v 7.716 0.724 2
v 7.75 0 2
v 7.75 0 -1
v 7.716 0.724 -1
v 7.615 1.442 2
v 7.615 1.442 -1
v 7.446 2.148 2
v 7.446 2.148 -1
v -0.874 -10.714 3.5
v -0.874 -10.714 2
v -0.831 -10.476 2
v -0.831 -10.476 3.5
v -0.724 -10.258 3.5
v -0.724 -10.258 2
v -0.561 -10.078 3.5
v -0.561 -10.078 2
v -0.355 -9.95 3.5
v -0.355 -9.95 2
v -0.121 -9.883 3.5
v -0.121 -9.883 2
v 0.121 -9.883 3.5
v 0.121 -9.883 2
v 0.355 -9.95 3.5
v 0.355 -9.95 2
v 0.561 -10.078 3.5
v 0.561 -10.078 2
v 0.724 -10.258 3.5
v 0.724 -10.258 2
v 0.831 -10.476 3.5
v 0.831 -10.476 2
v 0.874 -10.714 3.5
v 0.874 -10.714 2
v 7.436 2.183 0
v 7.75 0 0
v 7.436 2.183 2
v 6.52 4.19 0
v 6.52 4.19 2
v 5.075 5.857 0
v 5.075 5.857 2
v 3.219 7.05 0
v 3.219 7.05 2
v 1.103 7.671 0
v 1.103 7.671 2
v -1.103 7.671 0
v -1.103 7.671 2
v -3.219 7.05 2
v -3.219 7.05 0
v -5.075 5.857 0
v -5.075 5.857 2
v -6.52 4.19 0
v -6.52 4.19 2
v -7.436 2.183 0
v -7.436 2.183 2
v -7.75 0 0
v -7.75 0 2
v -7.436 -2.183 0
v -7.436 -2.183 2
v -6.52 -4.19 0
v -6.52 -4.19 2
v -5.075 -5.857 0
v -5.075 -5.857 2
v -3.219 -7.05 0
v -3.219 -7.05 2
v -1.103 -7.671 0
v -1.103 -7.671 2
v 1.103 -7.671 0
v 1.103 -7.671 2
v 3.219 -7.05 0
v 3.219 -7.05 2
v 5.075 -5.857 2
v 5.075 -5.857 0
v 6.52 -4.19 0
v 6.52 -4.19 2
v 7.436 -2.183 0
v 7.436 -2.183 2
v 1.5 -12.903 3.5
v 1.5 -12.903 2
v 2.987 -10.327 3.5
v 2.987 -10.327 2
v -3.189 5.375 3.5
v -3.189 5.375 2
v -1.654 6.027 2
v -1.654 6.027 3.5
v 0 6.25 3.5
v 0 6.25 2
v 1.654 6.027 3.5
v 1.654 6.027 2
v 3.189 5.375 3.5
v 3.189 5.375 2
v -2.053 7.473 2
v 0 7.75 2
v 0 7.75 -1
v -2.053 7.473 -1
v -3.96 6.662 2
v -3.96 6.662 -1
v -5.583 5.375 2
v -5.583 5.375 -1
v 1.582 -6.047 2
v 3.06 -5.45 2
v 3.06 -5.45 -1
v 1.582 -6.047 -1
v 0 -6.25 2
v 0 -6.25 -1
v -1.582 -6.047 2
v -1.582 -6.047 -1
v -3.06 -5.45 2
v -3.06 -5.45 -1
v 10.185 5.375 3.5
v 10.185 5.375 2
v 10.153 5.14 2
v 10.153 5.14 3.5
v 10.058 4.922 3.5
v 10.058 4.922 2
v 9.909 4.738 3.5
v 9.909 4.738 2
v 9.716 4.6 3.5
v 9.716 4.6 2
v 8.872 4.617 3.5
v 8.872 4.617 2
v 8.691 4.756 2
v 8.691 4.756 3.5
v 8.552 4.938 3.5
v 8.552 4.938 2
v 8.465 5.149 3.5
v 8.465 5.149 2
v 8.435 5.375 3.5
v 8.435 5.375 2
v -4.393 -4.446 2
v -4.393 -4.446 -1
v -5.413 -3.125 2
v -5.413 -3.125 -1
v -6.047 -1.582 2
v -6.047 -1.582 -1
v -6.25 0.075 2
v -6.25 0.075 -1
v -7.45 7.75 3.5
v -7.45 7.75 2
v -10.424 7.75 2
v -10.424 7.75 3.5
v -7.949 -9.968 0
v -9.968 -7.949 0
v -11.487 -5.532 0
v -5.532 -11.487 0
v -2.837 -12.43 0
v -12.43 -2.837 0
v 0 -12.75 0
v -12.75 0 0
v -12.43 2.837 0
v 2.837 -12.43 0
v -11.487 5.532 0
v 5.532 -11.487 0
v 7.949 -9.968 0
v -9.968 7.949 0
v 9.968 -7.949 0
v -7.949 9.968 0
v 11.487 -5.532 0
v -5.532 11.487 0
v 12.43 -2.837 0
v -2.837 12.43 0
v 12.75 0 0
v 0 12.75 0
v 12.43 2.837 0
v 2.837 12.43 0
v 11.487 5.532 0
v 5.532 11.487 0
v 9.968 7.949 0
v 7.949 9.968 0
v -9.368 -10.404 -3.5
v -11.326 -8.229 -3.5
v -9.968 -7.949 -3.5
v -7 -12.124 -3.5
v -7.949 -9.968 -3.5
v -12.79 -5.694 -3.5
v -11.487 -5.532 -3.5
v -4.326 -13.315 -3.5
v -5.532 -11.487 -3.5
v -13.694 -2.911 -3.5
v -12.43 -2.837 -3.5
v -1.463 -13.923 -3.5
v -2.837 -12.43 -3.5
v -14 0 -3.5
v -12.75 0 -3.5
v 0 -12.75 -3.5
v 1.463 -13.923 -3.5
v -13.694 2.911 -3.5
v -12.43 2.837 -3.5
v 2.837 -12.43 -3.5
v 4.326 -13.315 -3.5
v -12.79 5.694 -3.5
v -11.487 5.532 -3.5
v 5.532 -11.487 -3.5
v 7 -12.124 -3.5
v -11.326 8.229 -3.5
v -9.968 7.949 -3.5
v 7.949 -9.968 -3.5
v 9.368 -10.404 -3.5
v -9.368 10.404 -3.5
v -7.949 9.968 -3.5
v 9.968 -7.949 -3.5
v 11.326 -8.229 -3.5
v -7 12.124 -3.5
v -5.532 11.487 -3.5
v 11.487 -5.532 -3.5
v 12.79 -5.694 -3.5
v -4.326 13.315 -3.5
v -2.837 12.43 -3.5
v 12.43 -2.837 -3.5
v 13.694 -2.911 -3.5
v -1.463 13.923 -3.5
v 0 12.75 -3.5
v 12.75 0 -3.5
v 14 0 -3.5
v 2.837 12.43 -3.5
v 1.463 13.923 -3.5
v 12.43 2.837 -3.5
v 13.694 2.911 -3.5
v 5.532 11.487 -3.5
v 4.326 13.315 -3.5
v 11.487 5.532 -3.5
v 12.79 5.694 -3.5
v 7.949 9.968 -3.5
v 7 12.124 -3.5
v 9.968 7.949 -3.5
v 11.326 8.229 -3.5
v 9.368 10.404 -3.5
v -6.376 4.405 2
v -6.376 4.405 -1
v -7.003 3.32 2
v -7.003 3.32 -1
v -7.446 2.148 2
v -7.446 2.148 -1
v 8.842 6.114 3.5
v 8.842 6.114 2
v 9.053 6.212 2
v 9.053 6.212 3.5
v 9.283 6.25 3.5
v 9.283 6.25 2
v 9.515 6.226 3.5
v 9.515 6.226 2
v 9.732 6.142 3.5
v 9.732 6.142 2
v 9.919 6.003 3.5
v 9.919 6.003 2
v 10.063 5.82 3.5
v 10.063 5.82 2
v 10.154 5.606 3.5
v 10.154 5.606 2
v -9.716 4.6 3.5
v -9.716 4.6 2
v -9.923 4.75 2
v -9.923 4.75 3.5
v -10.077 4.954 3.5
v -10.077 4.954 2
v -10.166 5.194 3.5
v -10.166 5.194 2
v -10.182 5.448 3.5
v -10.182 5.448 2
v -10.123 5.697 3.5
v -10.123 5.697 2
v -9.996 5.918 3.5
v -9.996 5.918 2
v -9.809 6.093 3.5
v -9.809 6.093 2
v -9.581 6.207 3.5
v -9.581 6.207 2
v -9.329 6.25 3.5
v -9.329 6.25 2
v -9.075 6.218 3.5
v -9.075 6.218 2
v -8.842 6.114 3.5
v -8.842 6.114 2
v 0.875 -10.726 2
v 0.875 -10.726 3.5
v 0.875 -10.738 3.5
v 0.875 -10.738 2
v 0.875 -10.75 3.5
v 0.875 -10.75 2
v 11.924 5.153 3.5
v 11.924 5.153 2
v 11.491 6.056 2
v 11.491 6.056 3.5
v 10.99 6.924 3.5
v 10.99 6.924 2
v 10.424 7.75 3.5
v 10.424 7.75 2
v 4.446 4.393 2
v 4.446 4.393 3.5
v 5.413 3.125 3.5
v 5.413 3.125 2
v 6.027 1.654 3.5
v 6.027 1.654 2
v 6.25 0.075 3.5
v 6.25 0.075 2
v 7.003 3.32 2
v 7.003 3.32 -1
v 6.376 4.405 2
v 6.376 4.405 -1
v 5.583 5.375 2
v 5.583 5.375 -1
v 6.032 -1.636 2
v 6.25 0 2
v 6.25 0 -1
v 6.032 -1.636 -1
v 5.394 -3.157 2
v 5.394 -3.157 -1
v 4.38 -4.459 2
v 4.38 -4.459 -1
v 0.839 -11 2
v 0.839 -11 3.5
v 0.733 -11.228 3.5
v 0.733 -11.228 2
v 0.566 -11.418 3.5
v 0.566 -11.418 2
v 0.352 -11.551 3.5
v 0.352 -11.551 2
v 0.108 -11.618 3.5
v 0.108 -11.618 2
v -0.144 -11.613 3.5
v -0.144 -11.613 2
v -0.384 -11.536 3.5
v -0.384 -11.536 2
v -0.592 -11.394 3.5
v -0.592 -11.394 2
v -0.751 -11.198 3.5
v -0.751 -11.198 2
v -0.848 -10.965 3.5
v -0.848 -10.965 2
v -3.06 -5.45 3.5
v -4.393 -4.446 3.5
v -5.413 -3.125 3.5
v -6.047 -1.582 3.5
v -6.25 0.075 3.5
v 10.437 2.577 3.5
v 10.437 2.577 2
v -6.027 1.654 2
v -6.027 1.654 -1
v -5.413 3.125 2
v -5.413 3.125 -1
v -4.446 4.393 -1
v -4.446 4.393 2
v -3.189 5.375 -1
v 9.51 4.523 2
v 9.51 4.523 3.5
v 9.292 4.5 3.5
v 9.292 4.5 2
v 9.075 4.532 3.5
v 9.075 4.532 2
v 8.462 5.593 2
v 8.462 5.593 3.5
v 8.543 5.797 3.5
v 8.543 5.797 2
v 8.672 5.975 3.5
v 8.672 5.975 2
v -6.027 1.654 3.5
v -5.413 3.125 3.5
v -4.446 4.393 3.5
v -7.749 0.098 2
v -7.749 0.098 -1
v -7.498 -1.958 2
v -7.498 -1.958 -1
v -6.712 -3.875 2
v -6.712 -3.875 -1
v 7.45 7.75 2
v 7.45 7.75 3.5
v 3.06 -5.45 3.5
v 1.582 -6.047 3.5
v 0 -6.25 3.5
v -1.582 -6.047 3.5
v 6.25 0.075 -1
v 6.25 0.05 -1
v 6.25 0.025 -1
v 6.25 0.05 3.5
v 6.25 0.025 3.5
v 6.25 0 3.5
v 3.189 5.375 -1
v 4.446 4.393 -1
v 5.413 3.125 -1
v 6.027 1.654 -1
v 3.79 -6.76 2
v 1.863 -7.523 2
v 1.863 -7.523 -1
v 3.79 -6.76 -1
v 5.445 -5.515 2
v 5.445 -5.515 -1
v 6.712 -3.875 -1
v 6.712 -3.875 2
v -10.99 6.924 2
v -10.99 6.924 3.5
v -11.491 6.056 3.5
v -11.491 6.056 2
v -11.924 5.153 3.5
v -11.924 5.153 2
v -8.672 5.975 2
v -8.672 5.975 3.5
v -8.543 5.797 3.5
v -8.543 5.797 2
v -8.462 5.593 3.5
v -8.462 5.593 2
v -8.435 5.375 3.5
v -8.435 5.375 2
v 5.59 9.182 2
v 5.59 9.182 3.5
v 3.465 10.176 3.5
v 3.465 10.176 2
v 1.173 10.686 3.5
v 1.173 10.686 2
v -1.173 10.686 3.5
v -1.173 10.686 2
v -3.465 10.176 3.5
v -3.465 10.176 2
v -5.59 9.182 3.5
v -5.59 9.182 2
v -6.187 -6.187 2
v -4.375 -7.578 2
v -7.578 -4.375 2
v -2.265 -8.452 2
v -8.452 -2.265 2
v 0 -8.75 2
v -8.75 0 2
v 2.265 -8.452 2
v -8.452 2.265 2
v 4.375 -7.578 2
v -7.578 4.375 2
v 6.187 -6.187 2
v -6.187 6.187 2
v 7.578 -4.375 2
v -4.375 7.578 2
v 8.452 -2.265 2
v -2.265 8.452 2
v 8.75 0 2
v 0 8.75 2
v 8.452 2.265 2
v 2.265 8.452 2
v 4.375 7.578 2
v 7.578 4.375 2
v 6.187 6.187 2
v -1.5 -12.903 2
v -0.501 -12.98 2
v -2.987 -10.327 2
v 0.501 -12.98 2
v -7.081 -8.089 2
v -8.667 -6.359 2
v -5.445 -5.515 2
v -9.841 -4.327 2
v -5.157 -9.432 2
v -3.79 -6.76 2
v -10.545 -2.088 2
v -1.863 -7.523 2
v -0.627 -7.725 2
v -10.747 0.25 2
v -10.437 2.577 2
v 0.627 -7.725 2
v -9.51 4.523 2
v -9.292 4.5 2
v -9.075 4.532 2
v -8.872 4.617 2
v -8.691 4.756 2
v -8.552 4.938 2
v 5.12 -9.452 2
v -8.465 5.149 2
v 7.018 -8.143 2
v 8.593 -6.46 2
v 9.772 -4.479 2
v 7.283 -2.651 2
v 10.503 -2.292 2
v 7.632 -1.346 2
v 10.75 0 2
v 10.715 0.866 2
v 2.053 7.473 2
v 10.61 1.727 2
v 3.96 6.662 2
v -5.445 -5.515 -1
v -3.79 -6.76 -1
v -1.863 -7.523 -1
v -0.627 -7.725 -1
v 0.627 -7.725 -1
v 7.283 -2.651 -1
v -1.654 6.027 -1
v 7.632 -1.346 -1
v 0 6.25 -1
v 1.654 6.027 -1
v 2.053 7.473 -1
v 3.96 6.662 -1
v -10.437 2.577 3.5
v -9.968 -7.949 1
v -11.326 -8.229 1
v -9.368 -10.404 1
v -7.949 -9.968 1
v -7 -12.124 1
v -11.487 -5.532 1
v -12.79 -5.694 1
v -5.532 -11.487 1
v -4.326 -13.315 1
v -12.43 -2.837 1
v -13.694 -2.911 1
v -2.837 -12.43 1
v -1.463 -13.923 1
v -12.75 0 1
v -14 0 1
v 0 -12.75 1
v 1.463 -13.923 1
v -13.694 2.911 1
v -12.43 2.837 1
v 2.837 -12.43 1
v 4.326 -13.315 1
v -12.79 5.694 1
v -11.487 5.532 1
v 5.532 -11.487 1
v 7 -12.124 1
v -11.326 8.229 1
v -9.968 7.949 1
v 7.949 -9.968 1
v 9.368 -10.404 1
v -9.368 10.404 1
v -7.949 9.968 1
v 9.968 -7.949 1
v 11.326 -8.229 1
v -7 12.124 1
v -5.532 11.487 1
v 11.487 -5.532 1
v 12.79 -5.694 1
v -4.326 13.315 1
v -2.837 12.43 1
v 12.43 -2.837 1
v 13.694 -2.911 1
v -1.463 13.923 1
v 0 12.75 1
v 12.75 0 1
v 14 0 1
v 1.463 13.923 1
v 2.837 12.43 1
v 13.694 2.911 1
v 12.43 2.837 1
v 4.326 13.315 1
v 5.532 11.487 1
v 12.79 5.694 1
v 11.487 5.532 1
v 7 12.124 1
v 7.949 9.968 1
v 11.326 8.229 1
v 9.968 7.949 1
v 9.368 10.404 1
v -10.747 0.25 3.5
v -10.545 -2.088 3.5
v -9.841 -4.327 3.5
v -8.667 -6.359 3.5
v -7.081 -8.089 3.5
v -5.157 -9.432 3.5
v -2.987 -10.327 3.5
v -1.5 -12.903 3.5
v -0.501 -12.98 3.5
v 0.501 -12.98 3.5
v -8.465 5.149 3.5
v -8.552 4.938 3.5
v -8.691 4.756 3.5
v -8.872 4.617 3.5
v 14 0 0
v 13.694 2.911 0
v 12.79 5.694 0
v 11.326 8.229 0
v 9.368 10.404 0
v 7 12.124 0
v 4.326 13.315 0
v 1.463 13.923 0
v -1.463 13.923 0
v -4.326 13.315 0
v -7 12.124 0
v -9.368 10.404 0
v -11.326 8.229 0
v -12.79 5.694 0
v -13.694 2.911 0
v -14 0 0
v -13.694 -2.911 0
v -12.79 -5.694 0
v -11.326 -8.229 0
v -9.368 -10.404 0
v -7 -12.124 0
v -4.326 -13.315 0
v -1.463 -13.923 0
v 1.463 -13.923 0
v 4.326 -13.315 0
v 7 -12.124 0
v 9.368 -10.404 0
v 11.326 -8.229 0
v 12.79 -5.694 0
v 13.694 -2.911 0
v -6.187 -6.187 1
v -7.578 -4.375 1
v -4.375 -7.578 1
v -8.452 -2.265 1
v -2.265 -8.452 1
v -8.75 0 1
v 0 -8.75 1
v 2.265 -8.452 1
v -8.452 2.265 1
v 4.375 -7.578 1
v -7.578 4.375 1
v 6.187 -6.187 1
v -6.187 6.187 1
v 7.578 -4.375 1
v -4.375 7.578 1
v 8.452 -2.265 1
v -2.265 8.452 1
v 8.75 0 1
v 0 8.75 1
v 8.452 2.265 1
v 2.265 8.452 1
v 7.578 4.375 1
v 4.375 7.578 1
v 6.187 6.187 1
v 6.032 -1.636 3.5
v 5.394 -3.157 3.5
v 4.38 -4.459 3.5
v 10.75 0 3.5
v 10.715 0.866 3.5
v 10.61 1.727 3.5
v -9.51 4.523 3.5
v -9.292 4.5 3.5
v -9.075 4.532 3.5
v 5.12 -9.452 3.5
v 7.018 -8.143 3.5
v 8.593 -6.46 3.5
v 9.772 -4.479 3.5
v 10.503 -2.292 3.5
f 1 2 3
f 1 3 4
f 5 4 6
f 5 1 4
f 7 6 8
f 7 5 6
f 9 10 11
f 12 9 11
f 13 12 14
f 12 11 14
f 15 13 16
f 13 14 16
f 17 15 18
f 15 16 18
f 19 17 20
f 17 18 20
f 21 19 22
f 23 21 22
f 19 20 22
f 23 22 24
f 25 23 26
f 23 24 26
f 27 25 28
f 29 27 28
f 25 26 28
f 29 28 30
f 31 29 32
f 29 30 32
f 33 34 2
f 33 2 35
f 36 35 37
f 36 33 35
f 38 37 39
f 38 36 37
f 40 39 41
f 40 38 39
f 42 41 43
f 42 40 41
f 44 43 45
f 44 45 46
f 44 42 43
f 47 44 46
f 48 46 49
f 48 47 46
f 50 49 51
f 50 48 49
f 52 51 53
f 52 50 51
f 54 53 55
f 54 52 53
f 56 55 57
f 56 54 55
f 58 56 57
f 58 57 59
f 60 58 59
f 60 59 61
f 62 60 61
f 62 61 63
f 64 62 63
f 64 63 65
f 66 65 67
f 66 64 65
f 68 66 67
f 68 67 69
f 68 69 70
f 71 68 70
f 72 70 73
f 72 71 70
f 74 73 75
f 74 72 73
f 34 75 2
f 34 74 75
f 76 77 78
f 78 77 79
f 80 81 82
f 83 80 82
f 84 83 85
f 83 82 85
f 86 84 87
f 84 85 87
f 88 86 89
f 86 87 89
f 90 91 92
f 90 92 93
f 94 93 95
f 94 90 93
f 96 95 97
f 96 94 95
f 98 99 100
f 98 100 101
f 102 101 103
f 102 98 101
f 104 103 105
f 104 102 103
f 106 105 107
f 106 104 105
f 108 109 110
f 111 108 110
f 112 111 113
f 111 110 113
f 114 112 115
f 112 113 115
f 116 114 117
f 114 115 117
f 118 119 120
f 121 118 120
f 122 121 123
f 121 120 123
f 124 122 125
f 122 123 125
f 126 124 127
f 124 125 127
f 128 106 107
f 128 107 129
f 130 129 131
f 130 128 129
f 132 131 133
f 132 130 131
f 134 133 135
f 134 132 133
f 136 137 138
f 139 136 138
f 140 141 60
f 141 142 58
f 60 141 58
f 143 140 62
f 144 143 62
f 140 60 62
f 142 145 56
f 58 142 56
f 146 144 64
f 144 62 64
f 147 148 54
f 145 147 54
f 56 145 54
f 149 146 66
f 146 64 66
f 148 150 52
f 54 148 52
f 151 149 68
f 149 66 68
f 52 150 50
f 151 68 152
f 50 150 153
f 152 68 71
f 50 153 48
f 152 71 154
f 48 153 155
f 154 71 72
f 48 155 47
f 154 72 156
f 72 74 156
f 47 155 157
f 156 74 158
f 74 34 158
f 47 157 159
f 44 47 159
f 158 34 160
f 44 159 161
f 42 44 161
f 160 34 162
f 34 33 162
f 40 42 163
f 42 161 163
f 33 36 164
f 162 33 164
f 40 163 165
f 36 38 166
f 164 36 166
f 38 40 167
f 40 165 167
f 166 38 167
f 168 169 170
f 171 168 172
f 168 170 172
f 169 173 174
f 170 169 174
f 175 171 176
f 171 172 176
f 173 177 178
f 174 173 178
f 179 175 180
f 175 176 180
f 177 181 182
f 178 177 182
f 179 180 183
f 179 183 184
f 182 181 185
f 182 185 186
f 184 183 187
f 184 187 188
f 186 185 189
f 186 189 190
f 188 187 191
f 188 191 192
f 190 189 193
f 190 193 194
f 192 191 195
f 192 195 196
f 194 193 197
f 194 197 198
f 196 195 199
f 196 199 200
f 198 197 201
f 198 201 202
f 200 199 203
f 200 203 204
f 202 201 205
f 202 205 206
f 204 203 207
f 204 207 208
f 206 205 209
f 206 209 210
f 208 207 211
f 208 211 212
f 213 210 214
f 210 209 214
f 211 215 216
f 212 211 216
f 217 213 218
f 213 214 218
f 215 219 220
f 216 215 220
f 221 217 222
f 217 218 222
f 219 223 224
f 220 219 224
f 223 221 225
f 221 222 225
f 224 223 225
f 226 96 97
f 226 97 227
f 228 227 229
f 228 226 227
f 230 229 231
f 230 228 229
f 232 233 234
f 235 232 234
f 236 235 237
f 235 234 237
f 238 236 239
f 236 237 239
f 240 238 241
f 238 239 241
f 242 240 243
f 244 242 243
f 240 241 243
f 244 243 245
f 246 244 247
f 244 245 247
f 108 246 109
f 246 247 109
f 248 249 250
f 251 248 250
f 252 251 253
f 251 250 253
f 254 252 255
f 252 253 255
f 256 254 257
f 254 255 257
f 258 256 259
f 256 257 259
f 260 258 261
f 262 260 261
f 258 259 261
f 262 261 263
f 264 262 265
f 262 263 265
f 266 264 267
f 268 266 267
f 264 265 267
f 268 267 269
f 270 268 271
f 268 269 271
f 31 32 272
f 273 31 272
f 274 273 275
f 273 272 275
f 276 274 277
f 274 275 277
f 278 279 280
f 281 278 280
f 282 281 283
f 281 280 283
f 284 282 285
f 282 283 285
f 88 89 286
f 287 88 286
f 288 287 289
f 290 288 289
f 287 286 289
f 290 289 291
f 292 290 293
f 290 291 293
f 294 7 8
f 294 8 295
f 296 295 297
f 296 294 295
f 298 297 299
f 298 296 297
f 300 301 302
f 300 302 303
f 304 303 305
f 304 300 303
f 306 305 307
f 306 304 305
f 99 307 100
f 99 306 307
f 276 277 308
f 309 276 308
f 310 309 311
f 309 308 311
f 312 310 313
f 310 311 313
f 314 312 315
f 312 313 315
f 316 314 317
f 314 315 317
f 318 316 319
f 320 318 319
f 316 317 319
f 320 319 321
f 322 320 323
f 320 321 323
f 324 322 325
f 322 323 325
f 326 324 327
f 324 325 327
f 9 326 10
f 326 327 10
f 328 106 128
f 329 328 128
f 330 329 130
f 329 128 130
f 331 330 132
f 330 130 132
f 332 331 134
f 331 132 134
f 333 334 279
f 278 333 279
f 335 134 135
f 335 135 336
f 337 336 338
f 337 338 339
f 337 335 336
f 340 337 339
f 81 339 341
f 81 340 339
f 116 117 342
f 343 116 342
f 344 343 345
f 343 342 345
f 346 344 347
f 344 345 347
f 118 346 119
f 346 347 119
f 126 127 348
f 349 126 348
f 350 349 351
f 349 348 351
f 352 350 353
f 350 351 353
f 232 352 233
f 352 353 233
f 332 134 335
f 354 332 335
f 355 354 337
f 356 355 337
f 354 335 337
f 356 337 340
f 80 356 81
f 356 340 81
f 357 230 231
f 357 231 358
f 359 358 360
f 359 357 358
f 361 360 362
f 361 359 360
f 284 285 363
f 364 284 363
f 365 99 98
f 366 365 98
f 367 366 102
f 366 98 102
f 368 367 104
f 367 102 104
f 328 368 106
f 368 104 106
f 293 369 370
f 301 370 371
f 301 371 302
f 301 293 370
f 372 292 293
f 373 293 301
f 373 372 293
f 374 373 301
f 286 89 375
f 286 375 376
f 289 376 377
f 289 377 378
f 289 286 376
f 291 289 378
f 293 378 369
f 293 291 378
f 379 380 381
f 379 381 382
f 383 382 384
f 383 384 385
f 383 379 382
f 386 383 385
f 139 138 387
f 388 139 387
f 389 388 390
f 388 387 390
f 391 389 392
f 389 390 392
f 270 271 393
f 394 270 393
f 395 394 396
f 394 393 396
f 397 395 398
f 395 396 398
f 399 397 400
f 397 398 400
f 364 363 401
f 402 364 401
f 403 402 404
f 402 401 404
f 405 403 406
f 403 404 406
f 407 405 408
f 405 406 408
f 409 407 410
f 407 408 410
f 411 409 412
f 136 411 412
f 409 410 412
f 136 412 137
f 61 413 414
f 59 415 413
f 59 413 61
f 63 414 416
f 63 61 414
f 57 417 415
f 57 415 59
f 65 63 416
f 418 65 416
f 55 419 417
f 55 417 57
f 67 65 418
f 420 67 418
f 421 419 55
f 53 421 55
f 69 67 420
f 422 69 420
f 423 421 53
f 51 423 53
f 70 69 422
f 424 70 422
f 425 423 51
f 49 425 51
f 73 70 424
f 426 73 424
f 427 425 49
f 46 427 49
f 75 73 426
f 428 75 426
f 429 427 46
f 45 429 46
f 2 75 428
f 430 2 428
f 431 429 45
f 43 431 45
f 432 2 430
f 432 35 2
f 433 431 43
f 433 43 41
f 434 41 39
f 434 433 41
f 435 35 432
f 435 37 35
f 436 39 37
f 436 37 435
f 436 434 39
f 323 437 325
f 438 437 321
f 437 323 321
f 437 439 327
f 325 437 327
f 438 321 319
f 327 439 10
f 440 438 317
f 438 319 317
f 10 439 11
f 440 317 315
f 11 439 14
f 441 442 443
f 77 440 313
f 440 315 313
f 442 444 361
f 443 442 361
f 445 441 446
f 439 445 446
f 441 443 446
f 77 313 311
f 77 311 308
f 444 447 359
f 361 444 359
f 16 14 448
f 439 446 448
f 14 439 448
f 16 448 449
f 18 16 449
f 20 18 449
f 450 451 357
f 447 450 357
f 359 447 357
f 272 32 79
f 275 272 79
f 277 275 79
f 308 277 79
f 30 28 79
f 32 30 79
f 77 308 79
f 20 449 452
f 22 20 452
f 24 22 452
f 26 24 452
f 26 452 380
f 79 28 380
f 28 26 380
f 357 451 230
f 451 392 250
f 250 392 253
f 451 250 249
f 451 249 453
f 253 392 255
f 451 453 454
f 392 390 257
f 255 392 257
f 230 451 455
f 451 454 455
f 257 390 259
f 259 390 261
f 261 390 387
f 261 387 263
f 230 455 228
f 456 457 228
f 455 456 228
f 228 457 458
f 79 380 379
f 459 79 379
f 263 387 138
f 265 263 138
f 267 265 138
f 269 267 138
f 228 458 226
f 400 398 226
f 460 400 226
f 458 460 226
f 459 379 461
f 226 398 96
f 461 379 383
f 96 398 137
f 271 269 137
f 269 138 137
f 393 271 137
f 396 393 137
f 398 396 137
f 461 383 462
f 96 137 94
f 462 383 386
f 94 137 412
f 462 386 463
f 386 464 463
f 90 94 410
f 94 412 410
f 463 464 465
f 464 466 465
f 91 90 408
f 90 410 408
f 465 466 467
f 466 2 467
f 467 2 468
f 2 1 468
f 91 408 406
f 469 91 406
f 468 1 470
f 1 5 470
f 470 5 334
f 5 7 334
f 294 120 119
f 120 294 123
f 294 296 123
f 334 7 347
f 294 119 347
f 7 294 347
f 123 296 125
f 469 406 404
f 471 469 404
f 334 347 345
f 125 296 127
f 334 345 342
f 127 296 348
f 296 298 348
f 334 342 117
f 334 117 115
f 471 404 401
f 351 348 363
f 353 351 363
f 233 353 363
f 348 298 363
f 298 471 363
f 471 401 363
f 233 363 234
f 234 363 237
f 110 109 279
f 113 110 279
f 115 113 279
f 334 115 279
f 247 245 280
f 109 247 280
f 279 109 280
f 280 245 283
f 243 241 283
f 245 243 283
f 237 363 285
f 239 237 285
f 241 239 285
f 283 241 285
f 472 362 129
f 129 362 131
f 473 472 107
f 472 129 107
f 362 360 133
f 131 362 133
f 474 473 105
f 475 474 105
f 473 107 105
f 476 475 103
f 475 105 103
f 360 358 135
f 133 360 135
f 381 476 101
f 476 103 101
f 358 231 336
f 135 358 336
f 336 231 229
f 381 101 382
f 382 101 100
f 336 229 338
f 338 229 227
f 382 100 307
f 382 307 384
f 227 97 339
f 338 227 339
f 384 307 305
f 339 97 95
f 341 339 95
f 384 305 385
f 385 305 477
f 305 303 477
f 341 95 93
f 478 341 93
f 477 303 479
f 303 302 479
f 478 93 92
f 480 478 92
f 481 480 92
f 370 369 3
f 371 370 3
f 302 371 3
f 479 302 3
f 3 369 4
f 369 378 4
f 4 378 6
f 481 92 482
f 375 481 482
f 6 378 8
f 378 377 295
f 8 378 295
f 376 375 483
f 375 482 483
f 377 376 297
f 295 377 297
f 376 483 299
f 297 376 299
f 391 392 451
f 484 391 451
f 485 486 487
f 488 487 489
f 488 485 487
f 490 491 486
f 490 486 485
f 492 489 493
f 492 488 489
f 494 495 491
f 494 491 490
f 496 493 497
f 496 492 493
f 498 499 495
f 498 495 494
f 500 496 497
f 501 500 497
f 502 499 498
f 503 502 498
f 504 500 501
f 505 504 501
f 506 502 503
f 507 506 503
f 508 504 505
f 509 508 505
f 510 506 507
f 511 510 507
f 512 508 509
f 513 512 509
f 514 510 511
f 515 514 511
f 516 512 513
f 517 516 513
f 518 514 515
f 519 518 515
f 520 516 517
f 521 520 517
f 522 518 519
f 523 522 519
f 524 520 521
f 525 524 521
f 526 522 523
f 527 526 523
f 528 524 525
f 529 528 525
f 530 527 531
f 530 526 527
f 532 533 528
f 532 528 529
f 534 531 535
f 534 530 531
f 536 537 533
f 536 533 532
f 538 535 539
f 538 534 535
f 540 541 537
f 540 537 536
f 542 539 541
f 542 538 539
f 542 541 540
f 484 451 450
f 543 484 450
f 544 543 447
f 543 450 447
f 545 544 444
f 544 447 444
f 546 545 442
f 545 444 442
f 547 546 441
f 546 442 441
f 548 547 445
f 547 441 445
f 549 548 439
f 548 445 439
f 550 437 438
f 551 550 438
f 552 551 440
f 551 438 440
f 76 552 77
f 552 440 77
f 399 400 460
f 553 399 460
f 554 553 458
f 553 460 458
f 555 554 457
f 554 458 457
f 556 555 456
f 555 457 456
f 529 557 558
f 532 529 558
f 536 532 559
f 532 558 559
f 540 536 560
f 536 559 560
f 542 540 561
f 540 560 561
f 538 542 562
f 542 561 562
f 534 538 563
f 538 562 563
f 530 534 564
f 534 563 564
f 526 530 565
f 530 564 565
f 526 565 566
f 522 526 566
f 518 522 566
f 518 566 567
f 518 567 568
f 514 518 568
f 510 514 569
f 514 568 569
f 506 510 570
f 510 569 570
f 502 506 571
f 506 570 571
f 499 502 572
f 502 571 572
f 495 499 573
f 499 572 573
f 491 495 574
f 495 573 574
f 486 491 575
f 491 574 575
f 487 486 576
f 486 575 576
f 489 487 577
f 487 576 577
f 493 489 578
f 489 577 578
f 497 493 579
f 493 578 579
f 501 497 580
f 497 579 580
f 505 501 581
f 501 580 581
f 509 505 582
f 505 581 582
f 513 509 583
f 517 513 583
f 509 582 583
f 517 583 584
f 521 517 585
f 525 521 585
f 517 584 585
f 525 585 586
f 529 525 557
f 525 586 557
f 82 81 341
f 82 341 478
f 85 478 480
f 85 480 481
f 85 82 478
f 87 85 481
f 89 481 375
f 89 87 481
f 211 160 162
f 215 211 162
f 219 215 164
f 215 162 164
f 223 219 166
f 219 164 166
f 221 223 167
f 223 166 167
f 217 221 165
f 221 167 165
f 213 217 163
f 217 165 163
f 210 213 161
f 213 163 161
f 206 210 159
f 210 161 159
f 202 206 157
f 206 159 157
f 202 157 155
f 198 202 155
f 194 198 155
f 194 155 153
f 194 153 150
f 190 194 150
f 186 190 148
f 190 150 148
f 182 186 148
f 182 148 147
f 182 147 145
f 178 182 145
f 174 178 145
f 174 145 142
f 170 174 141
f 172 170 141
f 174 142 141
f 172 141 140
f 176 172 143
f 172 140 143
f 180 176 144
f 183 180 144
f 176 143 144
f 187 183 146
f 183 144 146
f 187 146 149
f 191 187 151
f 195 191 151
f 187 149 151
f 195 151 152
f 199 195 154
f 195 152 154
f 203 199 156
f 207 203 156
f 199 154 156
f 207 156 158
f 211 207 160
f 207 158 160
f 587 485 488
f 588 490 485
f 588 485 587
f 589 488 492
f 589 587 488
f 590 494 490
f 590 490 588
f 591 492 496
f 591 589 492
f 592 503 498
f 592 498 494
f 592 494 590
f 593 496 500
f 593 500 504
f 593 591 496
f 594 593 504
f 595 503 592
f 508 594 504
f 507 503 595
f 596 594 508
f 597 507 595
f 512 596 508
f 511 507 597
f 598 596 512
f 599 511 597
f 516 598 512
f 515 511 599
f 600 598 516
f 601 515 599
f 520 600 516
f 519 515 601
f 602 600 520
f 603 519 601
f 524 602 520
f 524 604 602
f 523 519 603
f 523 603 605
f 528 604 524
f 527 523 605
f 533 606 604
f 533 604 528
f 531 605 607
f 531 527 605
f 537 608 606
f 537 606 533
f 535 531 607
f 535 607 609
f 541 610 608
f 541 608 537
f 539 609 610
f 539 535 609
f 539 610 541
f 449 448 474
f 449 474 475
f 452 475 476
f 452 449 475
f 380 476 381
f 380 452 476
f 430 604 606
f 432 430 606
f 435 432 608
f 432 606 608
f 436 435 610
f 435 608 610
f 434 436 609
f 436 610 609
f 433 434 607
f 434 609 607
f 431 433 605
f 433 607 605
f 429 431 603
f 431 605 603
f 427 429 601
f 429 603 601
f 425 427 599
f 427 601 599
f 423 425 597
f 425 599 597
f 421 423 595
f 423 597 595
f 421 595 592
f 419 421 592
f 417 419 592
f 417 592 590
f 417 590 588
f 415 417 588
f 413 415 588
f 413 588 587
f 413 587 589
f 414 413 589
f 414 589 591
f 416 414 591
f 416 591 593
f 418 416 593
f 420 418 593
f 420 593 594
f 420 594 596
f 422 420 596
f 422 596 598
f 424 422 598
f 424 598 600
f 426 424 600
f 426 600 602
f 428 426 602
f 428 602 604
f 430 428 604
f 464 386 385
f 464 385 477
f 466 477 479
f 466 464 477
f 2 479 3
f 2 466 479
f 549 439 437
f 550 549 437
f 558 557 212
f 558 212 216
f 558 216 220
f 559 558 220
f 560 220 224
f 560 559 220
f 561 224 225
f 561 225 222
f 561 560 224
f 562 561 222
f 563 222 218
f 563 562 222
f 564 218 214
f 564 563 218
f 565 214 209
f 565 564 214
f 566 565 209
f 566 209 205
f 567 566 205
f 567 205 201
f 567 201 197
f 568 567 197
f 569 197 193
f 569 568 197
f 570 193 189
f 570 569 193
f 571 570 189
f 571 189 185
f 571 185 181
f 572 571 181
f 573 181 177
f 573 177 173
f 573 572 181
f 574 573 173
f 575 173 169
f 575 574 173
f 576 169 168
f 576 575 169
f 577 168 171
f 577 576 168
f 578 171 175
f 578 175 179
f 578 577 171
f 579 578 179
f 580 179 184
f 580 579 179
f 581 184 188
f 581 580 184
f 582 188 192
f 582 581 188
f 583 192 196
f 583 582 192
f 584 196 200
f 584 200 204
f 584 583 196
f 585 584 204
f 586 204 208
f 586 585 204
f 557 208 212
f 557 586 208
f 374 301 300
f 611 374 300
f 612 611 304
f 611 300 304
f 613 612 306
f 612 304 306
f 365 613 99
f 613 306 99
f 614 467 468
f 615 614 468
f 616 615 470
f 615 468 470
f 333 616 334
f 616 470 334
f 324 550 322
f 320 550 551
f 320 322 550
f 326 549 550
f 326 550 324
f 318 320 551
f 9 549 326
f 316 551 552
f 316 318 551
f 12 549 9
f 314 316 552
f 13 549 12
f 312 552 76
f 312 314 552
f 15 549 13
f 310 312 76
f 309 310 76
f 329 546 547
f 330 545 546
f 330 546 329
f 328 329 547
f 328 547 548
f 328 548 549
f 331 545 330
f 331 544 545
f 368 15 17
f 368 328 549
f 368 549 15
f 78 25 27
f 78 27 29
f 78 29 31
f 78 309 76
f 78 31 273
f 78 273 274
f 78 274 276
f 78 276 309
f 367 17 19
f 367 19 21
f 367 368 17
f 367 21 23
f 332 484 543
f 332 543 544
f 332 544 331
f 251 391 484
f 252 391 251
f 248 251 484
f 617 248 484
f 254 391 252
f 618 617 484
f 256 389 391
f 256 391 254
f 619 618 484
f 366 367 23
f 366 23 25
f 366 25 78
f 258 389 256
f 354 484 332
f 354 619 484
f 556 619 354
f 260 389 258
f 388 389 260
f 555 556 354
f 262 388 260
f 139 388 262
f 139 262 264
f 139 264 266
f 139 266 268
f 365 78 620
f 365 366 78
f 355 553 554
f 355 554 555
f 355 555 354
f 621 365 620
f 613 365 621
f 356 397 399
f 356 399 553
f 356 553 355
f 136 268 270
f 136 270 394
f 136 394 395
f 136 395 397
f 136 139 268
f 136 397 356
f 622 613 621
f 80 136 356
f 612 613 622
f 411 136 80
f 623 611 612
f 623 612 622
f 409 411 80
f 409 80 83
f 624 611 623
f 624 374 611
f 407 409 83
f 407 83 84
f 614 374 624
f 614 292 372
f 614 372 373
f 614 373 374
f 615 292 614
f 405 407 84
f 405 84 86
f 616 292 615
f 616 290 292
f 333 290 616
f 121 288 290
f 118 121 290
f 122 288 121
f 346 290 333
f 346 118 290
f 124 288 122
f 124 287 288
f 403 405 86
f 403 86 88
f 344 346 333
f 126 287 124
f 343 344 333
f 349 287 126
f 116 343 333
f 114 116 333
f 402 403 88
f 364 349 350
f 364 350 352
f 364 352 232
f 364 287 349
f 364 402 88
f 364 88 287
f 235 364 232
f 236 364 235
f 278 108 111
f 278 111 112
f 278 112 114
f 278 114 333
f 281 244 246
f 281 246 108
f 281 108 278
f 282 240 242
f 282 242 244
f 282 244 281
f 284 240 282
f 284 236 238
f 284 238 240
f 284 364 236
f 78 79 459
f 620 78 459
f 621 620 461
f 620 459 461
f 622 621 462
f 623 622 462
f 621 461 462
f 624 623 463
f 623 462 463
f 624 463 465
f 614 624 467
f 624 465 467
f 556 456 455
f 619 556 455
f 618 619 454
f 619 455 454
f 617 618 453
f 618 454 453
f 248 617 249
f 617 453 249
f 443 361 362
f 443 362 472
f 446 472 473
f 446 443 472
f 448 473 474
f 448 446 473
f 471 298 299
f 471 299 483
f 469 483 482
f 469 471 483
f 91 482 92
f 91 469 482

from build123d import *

# Parameters (mm, degrees)
F0_R          = 8.75
F0_R_2        = 7.75
F1_DEPTH      = 2
F0_R_3        = 12.75
F2_DEPTH      = 1
F0_R_4        = 14
F3_DEPTH      = 3.5
F3_DEPTH_BACK = 1
F5_DEPTH      = 1.5
F6_DEPTH      = 3


# Not quite as in the source:
# - ends of sketch curves that miss each other by under 0.0002 mm in the source are joined


with BuildPart() as f1:
    # F0 (on Top) → F1 (new body)
    with BuildSketch(Plane.XY):
        Circle(F0_R)
        Circle(F0_R_2, mode=Mode.SUBTRACT)
    extrude(amount=F1_DEPTH)

    # F0 (on Top) → F2 (join)
    with BuildSketch(Plane.XY):
        Circle(F0_R_3)
        Circle(F0_R, mode=Mode.SUBTRACT)
    extrude(amount=F2_DEPTH)

    # F0 (on Top) → F3 (join, two sides)
    with BuildSketch(Plane.XY) as f3_sk:
        Circle(F0_R_4)
        Circle(F0_R_3, mode=Mode.SUBTRACT)
    extrude(amount=-F3_DEPTH)
    extrude(f3_sk.sketch, amount=F3_DEPTH_BACK)


with BuildPart() as f5:
    # F4 (on face) → F5 (new body)
    with BuildSketch(Plane.XY.offset(2)):
        with BuildLine():
            Line((-7.4498323446, 7.7499998733), (-10.4241976301, 7.7499998733))
            ThreePointArc((-10.4241976301, 7.7499998733), (-11.2492131147, 6.49473622), (-11.9237955847, 5.1526200251))
            Line((-11.9237955847, 5.1526200251), (-10.436612942, 2.5767441277))
            ThreePointArc((-10.436612942, 2.5767441277), (-10.1269990673, 3.606437285), (-9.7160710573, 4.6000503485))
            ThreePointArc((-9.7160710573, 4.6000503485), (-10.067545319, 5.8125), (-8.8417959892, 6.1143391863))
            ThreePointArc((-8.8417959892, 6.1143391863), (-8.1867658396, 6.9670198139), (-7.4498323446, 7.7499998733))
        make_face()
        with BuildLine():
            Line((1.4995979546, -12.9026198984), (2.9867805973, -10.3267440011))
            ThreePointArc((2.9867805973, -10.3267440011), (1.9402332277, -10.5734570989), (0.8742750681, -10.7143895349))
            ThreePointArc((0.8742750681, -10.7143895349), (0.8748187483, -10.7321910784), (0.875, -10.75))
            ThreePointArc((0.875, -10.75), (-0.0178089216, -11.6248187483), (-0.8742750681, -10.7143895349))
            ThreePointArc((-0.8742750681, -10.7143895349), (-1.9402332277, -10.5734570989), (-2.9867805973, -10.3267440011))
            Line((-2.9867805973, -10.3267440011), (-1.4995979546, -12.9026198984))
            ThreePointArc((-1.4995979546, -12.9026198984), (0, -12.9894724399), (1.4995979546, -12.9026198984))
        make_face()
        with BuildLine():
            ThreePointArc((9.7160710573, 4.6000503485), (10.1269990673, 3.606437285), (10.436612942, 2.5767441277))
            Line((10.436612942, 2.5767441277), (11.9237955847, 5.1526200251))
            ThreePointArc((11.9237955847, 5.1526200251), (11.2492131147, 6.49473622), (10.4241976301, 7.7499998733))
            Line((10.4241976301, 7.7499998733), (7.4498323446, 7.7499998733))
            ThreePointArc((7.4498323446, 7.7499998733), (8.1867658396, 6.9670198139), (8.8417959892, 6.1143391863))
            ThreePointArc((8.8417959892, 6.1143391863), (9.7317594863, 6.1415197205), (10.1847730907, 5.375))
            ThreePointArc((10.1847730907, 5.375), (10.0584838896, 4.9221676474), (9.7160710573, 4.6000503485))
        make_face()
        with BuildLine():
            Line((4.062019444, 7.7499998733), (7.4498323446, 7.7499998733))
            ThreePointArc((7.4498323446, 7.7499998733), (0, 10.75), (-7.4498323446, 7.7499998733))
            Line((-7.4498323446, 7.7499998733), (-4.062019444, 7.7499998733))
            ThreePointArc((-4.062019444, 7.7499998733), (0, 8.75), (4.062019444, 7.7499998733))
        make_face()
        with BuildLine():
            Line((-4.062019444, 7.7499998733), (-7.4498323446, 7.7499998733))
            ThreePointArc((-7.4498323446, 7.7499998733), (-8.1867658396, 6.9670198139), (-8.8417959892, 6.1143391863))
            ThreePointArc((-8.8417959892, 6.1143391863), (-8.5432533702, 5.7969863956), (-8.4347730907, 5.375))
            Line((-8.4347730907, 5.375), (-6.9044822398, 5.375))
            ThreePointArc((-6.9044822398, 5.375), (-5.6103650411, 6.7146335794), (-4.062019444, 7.7499998733))
        make_face()
        with BuildLine():
            Line((-6.9044822398, 5.375), (-8.4347730907, 5.375))
            ThreePointArc((-8.4347730907, 5.375), (-8.5520008624, 4.9375), (-8.8722730907, 4.6172277717))
            Line((-8.8722730907, 4.6172277717), (-8.1071276653, 3.2919570197))
            ThreePointArc((-8.1071276653, 3.2919570197), (-7.5777222831, 4.375), (-6.9044822398, 5.375))
        make_face()
        with BuildLine():
            ThreePointArc((-9.7160710573, 4.6000503485), (-10.1269990673, 3.606437285), (-10.436612942, 2.5767441277))
            Line((-10.436612942, 2.5767441277), (-8.7427064916, -0.3571879075))
            ThreePointArc((-8.7427064916, -0.3571879075), (-8.6202257774, 1.5014018604), (-8.1071276653, 3.2919570197))
            Line((-8.1071276653, 3.2919570197), (-8.8722730907, 4.6172277717))
            ThreePointArc((-8.8722730907, 4.6172277717), (-9.2919641691, 4.5001812517), (-9.7160710573, 4.6000503485))
        make_face()
        with BuildLine():
            ThreePointArc((-10.436612942, 2.5767441277), (-9.3097730907, -5.375), (-2.9867805973, -10.3267440011))
            Line((-2.9867805973, -10.3267440011), (-4.6806870477, -7.3928119658))
            ThreePointArc((-4.6806870477, -7.3928119658), (-7.5777222831, -4.375), (-8.7427064916, -0.3571879075))
            Line((-8.7427064916, -0.3571879075), (-10.436612942, 2.5767441277))
        make_face()
        with BuildLine():
            ThreePointArc((-2.9867805973, -10.3267440011), (-1.9402332277, -10.5734570989), (-0.8742750681, -10.7143895349))
            ThreePointArc((-0.8742750681, -10.7143895349), (-0.7487107989, -10.2971676474), (-0.4375, -9.9922277717))
            Line((-0.4375, -9.9922277717), (-1.2026454254, -8.6669570197))
            ThreePointArc((-1.2026454254, -8.6669570197), (-3.0098607363, -8.2160354398), (-4.6806870477, -7.3928119658))
            Line((-4.6806870477, -7.3928119658), (-2.9867805973, -10.3267440011))
        make_face()
        with BuildLine():
            ThreePointArc((0.8742750681, -10.7143895349), (1.9402332277, -10.5734570989), (2.9867805973, -10.3267440011))
            Line((2.9867805973, -10.3267440011), (4.6806870477, -7.3928119658))
            ThreePointArc((4.6806870477, -7.3928119658), (3.0098607363, -8.2160354398), (1.2026454254, -8.6669570197))
            Line((1.2026454254, -8.6669570197), (0.4375, -9.9922277717))
            ThreePointArc((0.4375, -9.9922277717), (0.7487107989, -10.2971676474), (0.8742750681, -10.7143895349))
        make_face()
        with BuildLine():
            ThreePointArc((2.9867805973, -10.3267440011), (8.592740873, -6.4596675061), (10.75, 0))
            ThreePointArc((10.75, 0), (10.6713656372, 1.2978657238), (10.436612942, 2.5767441277))
            Line((10.436612942, 2.5767441277), (8.7427064916, -0.3571879075))
            ThreePointArc((8.7427064916, -0.3571879075), (7.5777222831, -4.375), (4.6806870477, -7.3928119658))
            Line((4.6806870477, -7.3928119658), (2.9867805973, -10.3267440011))
        make_face()
        with BuildLine():
            Line((8.7427064916, -0.3571879075), (10.436612942, 2.5767441277))
            ThreePointArc((10.436612942, 2.5767441277), (10.1269990673, 3.606437285), (9.7160710573, 4.6000503485))
            ThreePointArc((9.7160710573, 4.6000503485), (9.2919641691, 4.5001812517), (8.8722730907, 4.6172277717))
            Line((8.8722730907, 4.6172277717), (8.1071276653, 3.2919570197))
            ThreePointArc((8.1071276653, 3.2919570197), (8.5877781489, 1.6770707989), (8.75, 0))
            ThreePointArc((8.75, 0), (8.7481764329, -0.1786311819), (8.7427064916, -0.3571879075))
        make_face()
        with BuildLine():
            Line((8.1071276653, 3.2919570197), (8.8722730907, 4.6172277717))
            ThreePointArc((8.8722730907, 4.6172277717), (8.5520008624, 4.9375), (8.4347730907, 5.375))
            Line((8.4347730907, 5.375), (6.9044822398, 5.375))
            ThreePointArc((6.9044822398, 5.375), (7.5777222831, 4.375), (8.1071276653, 3.2919570197))
        make_face()
        with BuildLine():
            ThreePointArc((8.4347730907, 5.375), (8.5432533702, 5.7969863956), (8.8417959892, 6.1143391863))
            ThreePointArc((8.8417959892, 6.1143391863), (8.1867658396, 6.9670198139), (7.4498323446, 7.7499998733))
            Line((7.4498323446, 7.7499998733), (4.062019444, 7.7499998733))
            ThreePointArc((4.062019444, 7.7499998733), (5.6103650411, 6.7146335794), (6.9044822398, 5.375))
            Line((6.9044822398, 5.375), (8.4347730907, 5.375))
        make_face()
        with BuildLine():
            ThreePointArc((-0.4375, -9.9922277717), (0, -9.875), (0.4375, -9.9922277717))
            Line((0.4375, -9.9922277717), (1.2026454254, -8.6669570197))
            ThreePointArc((1.2026454254, -8.6669570197), (0, -8.75), (-1.2026454254, -8.6669570197))
            Line((-1.2026454254, -8.6669570197), (-0.4375, -9.9922277717))
        make_face()
        with BuildLine():
            Line((0, 7.7499998733), (4.062019444, 7.7499998733))
            ThreePointArc((4.062019444, 7.7499998733), (0, 8.75), (-4.062019444, 7.7499998733))
            Line((-4.062019444, 7.7499998733), (0, 7.7499998733))
        make_face()
        with BuildLine():
            Line((0, 7.7499998733), (-4.062019444, 7.7499998733))
            ThreePointArc((-4.062019444, 7.7499998733), (-5.6103650411, 6.7146335794), (-6.9044822398, 5.375))
            Line((-6.9044822398, 5.375), (-5.5831778585, 5.375))
            ThreePointArc((-5.5831778585, 5.375), (-3.0336652749, 7.1315759128), (0, 7.7499998733))
        make_face()
        with BuildLine():
            Line((-5.5831778585, 5.375), (-6.9044822398, 5.375))
            ThreePointArc((-6.9044822398, 5.375), (-7.5777222831, 4.375), (-8.1071276653, 3.2919570197))
            Line((-8.1071276653, 3.2919570197), (-7.4464754746, 2.1476738593))
            ThreePointArc((-7.4464754746, 2.1476738593), (-6.7116968793, 3.875), (-5.5831778585, 5.375))
        make_face()
        with BuildLine():
            Line((-8.7427064916, -0.3571879075), (-6.7116967696, -3.8749999367))
            ThreePointArc((-6.7116967696, -3.8749999367), (-7.6929585469, -0.9385567618), (-7.4464754746, 2.1476738593))
            Line((-7.4464754746, 2.1476738593), (-8.1071276653, 3.2919570197))
            ThreePointArc((-8.1071276653, 3.2919570197), (-8.6202257774, 1.5014018604), (-8.7427064916, -0.3571879075))
        make_face()
        with BuildLine():
            ThreePointArc((-8.7427064916, -0.3571879075), (-7.5777222831, -4.375), (-4.6806870477, -7.3928119658))
            Line((-4.6806870477, -7.3928119658), (-6.7116967696, -3.8749999367))
            Line((-6.7116967696, -3.8749999367), (-8.7427064916, -0.3571879075))
        make_face()
        with BuildLine():
            ThreePointArc((-4.6806870477, -7.3928119658), (-3.0098607363, -8.2160354398), (-1.2026454254, -8.6669570197))
            Line((-1.2026454254, -8.6669570197), (-1.8632976161, -7.5226738593))
            ThreePointArc((-1.8632976161, -7.5226738593), (-4.6592932721, -6.193019151), (-6.7116968793, -3.875))
            Line((-6.7116968793, -3.875), (-4.6806870477, -7.3928119658))
        make_face()
        with BuildLine():
            ThreePointArc((-1.2026454254, -8.6669570197), (0, -8.75), (1.2026454254, -8.6669570197))
            Line((1.2026454254, -8.6669570197), (1.8632976161, -7.5226738593))
            ThreePointArc((1.8632976161, -7.5226738593), (0, -7.75), (-1.8632976161, -7.5226738593))
            Line((-1.8632976161, -7.5226738593), (-1.2026454254, -8.6669570197))
        make_face()
        with BuildLine():
            ThreePointArc((1.2026454254, -8.6669570197), (3.0098607363, -8.2160354398), (4.6806870477, -7.3928119658))
            Line((4.6806870477, -7.3928119658), (6.7116967696, -3.8749999367))
            ThreePointArc((6.7116967696, -3.8749999367), (4.6592932721, -6.193019151), (1.8632976161, -7.5226738593))
            Line((1.8632976161, -7.5226738593), (1.2026454254, -8.6669570197))
        make_face()
        with BuildLine():
            ThreePointArc((4.6806870477, -7.3928119658), (7.5777222831, -4.375), (8.7427064916, -0.3571879075))
            Line((8.7427064916, -0.3571879075), (6.7116967696, -3.8749999367))
            Line((6.7116967696, -3.8749999367), (4.6806870477, -7.3928119658))
        make_face()
        with BuildLine():
            Line((6.7116967696, -3.8749999367), (8.7427064916, -0.3571879075))
            ThreePointArc((8.7427064916, -0.3571879075), (8.7481764329, -0.1786311819), (8.75, 0))
            ThreePointArc((8.75, 0), (8.5877781489, 1.6770707989), (8.1071276653, 3.2919570197))
            Line((8.1071276653, 3.2919570197), (7.4464754746, 2.1476738593))
            ThreePointArc((7.4464754746, 2.1476738593), (7.6737437059, 1.0845079695), (7.75, 0))
            ThreePointArc((7.75, 0), (7.4859251537, -2.0058475995), (6.7116967696, -3.8749999367))
        make_face()
        with BuildLine():
            Line((7.4464754746, 2.1476738593), (8.1071276653, 3.2919570197))
            ThreePointArc((8.1071276653, 3.2919570197), (7.5777222831, 4.375), (6.9044822398, 5.375))
            Line((6.9044822398, 5.375), (5.5831778585, 5.375))
            ThreePointArc((5.5831778585, 5.375), (6.7116968793, 3.875), (7.4464754746, 2.1476738593))
        make_face()
        with BuildLine():
            Line((5.5831778585, 5.375), (6.9044822398, 5.375))
            ThreePointArc((6.9044822398, 5.375), (5.6103650411, 6.7146335794), (4.062019444, 7.7499998733))
            Line((4.062019444, 7.7499998733), (0, 7.7499998733))
            ThreePointArc((0, 7.7499998733), (3.0336652749, 7.1315759128), (5.5831778585, 5.375))
        make_face()
        with BuildLine():
            Line((3.1893377055, 5.375), (5.5831778585, 5.375))
            ThreePointArc((5.5831778585, 5.375), (3.0336652749, 7.1315759128), (0, 7.75))
            ThreePointArc((0, 7.75), (-3.0336652749, 7.1315759128), (-5.5831778585, 5.375))
            Line((-5.5831778585, 5.375), (-3.1893377055, 5.375))
            ThreePointArc((-3.1893377055, 5.375), (0, 6.25), (3.1893377055, 5.375))
        make_face()
        with BuildLine():
            Line((-3.1893377055, 5.375), (-5.5831778585, 5.375))
            ThreePointArc((-5.5831778585, 5.375), (-6.7116968793, 3.875), (-7.4464754746, 2.1476738593))
            Line((-7.4464754746, 2.1476738593), (-6.2495553981, 0.0745474742))
            ThreePointArc((-6.2495553981, 0.0745474742), (-5.4126587737, 3.125), (-3.1893377055, 5.375))
        make_face()
        with BuildLine():
            ThreePointArc((-6.7116968793, -3.875), (-4.6592932721, -6.193019151), (-1.8632976161, -7.5226738593))
            Line((-1.8632976161, -7.5226738593), (-3.0602176926, -5.4495474742))
            ThreePointArc((-3.0602176926, -5.4495474742), (-5.4126587737, -3.125), (-6.2495553981, 0.0745474742))
            Line((-6.2495553981, 0.0745474742), (-7.4464754746, 2.1476738593))
            ThreePointArc((-7.4464754746, 2.1476738593), (-7.6929585469, -0.9385567618), (-6.7116968793, -3.875))
        make_face()
        with BuildLine():
            ThreePointArc((1.8632976161, -7.5226738593), (4.6592932721, -6.193019151), (6.7116968793, -3.875))
            ThreePointArc((6.7116968793, -3.875), (7.4859251537, -2.0058475995), (7.75, 0))
            ThreePointArc((7.75, 0), (7.6737437059, 1.0845079695), (7.4464754746, 2.1476738593))
            Line((7.4464754746, 2.1476738593), (6.2495553981, 0.0745474742))
            ThreePointArc((6.2495553981, 0.0745474742), (6.2498888485, 0.0372744), (6.25, 0))
            ThreePointArc((6.25, 0), (5.3939253137, -3.1572250016), (3.0602176926, -5.4495474742))
            Line((3.0602176926, -5.4495474742), (1.8632976161, -7.5226738593))
        make_face()
        with BuildLine():
            Line((6.2495553981, 0.0745474742), (7.4464754746, 2.1476738593))
            ThreePointArc((7.4464754746, 2.1476738593), (6.7116968793, 3.875), (5.5831778585, 5.375))
            Line((5.5831778585, 5.375), (3.1893377055, 5.375))
            ThreePointArc((3.1893377055, 5.375), (5.4126587737, 3.125), (6.2495553981, 0.0745474742))
        make_face()
        with BuildLine():
            ThreePointArc((-1.8632976161, -7.5226738593), (0, -7.75), (1.8632976161, -7.5226738593))
            Line((1.8632976161, -7.5226738593), (3.0602176926, -5.4495474742))
            ThreePointArc((3.0602176926, -5.4495474742), (0, -6.25), (-3.0602176926, -5.4495474742))
            Line((-3.0602176926, -5.4495474742), (-1.8632976161, -7.5226738593))
        make_face()
    extrude(amount=F5_DEPTH)

    # F4 (on face) → F6 (join)
    with BuildSketch(Plane.XY.offset(2)):
        with BuildLine():
            Line((3.1893377055, 5.375), (5.5831778585, 5.375))
            ThreePointArc((5.5831778585, 5.375), (3.0336652749, 7.1315759128), (0, 7.75))
            ThreePointArc((0, 7.75), (-3.0336652749, 7.1315759128), (-5.5831778585, 5.375))
            Line((-5.5831778585, 5.375), (-3.1893377055, 5.375))
            ThreePointArc((-3.1893377055, 5.375), (0, 6.25), (3.1893377055, 5.375))
        make_face()
        with BuildLine():
            Line((-3.1893377055, 5.375), (-5.5831778585, 5.375))
            ThreePointArc((-5.5831778585, 5.375), (-6.7116968793, 3.875), (-7.4464754746, 2.1476738593))
            Line((-7.4464754746, 2.1476738593), (-6.2495553981, 0.0745474742))
            ThreePointArc((-6.2495553981, 0.0745474742), (-5.4126587737, 3.125), (-3.1893377055, 5.375))
        make_face()
        with BuildLine():
            ThreePointArc((-6.7116968793, -3.875), (-4.6592932721, -6.193019151), (-1.8632976161, -7.5226738593))
            Line((-1.8632976161, -7.5226738593), (-3.0602176926, -5.4495474742))
            ThreePointArc((-3.0602176926, -5.4495474742), (-5.4126587737, -3.125), (-6.2495553981, 0.0745474742))
            Line((-6.2495553981, 0.0745474742), (-7.4464754746, 2.1476738593))
            ThreePointArc((-7.4464754746, 2.1476738593), (-7.6929585469, -0.9385567618), (-6.7116968793, -3.875))
        make_face()
        with BuildLine():
            ThreePointArc((-1.8632976161, -7.5226738593), (0, -7.75), (1.8632976161, -7.5226738593))
            Line((1.8632976161, -7.5226738593), (3.0602176926, -5.4495474742))
            ThreePointArc((3.0602176926, -5.4495474742), (0, -6.25), (-3.0602176926, -5.4495474742))
            Line((-3.0602176926, -5.4495474742), (-1.8632976161, -7.5226738593))
        make_face()
        with BuildLine():
            ThreePointArc((1.8632976161, -7.5226738593), (4.6592932721, -6.193019151), (6.7116968793, -3.875))
            ThreePointArc((6.7116968793, -3.875), (7.4859251537, -2.0058475995), (7.75, 0))
            ThreePointArc((7.75, 0), (7.6737437059, 1.0845079695), (7.4464754746, 2.1476738593))
            Line((7.4464754746, 2.1476738593), (6.2495553981, 0.0745474742))
            ThreePointArc((6.2495553981, 0.0745474742), (6.2498888485, 0.0372744), (6.25, 0))
            ThreePointArc((6.25, 0), (5.3939253137, -3.1572250016), (3.0602176926, -5.4495474742))
            Line((3.0602176926, -5.4495474742), (1.8632976161, -7.5226738593))
        make_face()
        with BuildLine():
            Line((6.2495553981, 0.0745474742), (7.4464754746, 2.1476738593))
            ThreePointArc((7.4464754746, 2.1476738593), (6.7116968793, 3.875), (5.5831778585, 5.375))
            Line((5.5831778585, 5.375), (3.1893377055, 5.375))
            ThreePointArc((3.1893377055, 5.375), (5.4126587737, 3.125), (6.2495553981, 0.0745474742))
        make_face()
    extrude(amount=-F6_DEPTH)


solid = Compound([f1.part, f5.part])
